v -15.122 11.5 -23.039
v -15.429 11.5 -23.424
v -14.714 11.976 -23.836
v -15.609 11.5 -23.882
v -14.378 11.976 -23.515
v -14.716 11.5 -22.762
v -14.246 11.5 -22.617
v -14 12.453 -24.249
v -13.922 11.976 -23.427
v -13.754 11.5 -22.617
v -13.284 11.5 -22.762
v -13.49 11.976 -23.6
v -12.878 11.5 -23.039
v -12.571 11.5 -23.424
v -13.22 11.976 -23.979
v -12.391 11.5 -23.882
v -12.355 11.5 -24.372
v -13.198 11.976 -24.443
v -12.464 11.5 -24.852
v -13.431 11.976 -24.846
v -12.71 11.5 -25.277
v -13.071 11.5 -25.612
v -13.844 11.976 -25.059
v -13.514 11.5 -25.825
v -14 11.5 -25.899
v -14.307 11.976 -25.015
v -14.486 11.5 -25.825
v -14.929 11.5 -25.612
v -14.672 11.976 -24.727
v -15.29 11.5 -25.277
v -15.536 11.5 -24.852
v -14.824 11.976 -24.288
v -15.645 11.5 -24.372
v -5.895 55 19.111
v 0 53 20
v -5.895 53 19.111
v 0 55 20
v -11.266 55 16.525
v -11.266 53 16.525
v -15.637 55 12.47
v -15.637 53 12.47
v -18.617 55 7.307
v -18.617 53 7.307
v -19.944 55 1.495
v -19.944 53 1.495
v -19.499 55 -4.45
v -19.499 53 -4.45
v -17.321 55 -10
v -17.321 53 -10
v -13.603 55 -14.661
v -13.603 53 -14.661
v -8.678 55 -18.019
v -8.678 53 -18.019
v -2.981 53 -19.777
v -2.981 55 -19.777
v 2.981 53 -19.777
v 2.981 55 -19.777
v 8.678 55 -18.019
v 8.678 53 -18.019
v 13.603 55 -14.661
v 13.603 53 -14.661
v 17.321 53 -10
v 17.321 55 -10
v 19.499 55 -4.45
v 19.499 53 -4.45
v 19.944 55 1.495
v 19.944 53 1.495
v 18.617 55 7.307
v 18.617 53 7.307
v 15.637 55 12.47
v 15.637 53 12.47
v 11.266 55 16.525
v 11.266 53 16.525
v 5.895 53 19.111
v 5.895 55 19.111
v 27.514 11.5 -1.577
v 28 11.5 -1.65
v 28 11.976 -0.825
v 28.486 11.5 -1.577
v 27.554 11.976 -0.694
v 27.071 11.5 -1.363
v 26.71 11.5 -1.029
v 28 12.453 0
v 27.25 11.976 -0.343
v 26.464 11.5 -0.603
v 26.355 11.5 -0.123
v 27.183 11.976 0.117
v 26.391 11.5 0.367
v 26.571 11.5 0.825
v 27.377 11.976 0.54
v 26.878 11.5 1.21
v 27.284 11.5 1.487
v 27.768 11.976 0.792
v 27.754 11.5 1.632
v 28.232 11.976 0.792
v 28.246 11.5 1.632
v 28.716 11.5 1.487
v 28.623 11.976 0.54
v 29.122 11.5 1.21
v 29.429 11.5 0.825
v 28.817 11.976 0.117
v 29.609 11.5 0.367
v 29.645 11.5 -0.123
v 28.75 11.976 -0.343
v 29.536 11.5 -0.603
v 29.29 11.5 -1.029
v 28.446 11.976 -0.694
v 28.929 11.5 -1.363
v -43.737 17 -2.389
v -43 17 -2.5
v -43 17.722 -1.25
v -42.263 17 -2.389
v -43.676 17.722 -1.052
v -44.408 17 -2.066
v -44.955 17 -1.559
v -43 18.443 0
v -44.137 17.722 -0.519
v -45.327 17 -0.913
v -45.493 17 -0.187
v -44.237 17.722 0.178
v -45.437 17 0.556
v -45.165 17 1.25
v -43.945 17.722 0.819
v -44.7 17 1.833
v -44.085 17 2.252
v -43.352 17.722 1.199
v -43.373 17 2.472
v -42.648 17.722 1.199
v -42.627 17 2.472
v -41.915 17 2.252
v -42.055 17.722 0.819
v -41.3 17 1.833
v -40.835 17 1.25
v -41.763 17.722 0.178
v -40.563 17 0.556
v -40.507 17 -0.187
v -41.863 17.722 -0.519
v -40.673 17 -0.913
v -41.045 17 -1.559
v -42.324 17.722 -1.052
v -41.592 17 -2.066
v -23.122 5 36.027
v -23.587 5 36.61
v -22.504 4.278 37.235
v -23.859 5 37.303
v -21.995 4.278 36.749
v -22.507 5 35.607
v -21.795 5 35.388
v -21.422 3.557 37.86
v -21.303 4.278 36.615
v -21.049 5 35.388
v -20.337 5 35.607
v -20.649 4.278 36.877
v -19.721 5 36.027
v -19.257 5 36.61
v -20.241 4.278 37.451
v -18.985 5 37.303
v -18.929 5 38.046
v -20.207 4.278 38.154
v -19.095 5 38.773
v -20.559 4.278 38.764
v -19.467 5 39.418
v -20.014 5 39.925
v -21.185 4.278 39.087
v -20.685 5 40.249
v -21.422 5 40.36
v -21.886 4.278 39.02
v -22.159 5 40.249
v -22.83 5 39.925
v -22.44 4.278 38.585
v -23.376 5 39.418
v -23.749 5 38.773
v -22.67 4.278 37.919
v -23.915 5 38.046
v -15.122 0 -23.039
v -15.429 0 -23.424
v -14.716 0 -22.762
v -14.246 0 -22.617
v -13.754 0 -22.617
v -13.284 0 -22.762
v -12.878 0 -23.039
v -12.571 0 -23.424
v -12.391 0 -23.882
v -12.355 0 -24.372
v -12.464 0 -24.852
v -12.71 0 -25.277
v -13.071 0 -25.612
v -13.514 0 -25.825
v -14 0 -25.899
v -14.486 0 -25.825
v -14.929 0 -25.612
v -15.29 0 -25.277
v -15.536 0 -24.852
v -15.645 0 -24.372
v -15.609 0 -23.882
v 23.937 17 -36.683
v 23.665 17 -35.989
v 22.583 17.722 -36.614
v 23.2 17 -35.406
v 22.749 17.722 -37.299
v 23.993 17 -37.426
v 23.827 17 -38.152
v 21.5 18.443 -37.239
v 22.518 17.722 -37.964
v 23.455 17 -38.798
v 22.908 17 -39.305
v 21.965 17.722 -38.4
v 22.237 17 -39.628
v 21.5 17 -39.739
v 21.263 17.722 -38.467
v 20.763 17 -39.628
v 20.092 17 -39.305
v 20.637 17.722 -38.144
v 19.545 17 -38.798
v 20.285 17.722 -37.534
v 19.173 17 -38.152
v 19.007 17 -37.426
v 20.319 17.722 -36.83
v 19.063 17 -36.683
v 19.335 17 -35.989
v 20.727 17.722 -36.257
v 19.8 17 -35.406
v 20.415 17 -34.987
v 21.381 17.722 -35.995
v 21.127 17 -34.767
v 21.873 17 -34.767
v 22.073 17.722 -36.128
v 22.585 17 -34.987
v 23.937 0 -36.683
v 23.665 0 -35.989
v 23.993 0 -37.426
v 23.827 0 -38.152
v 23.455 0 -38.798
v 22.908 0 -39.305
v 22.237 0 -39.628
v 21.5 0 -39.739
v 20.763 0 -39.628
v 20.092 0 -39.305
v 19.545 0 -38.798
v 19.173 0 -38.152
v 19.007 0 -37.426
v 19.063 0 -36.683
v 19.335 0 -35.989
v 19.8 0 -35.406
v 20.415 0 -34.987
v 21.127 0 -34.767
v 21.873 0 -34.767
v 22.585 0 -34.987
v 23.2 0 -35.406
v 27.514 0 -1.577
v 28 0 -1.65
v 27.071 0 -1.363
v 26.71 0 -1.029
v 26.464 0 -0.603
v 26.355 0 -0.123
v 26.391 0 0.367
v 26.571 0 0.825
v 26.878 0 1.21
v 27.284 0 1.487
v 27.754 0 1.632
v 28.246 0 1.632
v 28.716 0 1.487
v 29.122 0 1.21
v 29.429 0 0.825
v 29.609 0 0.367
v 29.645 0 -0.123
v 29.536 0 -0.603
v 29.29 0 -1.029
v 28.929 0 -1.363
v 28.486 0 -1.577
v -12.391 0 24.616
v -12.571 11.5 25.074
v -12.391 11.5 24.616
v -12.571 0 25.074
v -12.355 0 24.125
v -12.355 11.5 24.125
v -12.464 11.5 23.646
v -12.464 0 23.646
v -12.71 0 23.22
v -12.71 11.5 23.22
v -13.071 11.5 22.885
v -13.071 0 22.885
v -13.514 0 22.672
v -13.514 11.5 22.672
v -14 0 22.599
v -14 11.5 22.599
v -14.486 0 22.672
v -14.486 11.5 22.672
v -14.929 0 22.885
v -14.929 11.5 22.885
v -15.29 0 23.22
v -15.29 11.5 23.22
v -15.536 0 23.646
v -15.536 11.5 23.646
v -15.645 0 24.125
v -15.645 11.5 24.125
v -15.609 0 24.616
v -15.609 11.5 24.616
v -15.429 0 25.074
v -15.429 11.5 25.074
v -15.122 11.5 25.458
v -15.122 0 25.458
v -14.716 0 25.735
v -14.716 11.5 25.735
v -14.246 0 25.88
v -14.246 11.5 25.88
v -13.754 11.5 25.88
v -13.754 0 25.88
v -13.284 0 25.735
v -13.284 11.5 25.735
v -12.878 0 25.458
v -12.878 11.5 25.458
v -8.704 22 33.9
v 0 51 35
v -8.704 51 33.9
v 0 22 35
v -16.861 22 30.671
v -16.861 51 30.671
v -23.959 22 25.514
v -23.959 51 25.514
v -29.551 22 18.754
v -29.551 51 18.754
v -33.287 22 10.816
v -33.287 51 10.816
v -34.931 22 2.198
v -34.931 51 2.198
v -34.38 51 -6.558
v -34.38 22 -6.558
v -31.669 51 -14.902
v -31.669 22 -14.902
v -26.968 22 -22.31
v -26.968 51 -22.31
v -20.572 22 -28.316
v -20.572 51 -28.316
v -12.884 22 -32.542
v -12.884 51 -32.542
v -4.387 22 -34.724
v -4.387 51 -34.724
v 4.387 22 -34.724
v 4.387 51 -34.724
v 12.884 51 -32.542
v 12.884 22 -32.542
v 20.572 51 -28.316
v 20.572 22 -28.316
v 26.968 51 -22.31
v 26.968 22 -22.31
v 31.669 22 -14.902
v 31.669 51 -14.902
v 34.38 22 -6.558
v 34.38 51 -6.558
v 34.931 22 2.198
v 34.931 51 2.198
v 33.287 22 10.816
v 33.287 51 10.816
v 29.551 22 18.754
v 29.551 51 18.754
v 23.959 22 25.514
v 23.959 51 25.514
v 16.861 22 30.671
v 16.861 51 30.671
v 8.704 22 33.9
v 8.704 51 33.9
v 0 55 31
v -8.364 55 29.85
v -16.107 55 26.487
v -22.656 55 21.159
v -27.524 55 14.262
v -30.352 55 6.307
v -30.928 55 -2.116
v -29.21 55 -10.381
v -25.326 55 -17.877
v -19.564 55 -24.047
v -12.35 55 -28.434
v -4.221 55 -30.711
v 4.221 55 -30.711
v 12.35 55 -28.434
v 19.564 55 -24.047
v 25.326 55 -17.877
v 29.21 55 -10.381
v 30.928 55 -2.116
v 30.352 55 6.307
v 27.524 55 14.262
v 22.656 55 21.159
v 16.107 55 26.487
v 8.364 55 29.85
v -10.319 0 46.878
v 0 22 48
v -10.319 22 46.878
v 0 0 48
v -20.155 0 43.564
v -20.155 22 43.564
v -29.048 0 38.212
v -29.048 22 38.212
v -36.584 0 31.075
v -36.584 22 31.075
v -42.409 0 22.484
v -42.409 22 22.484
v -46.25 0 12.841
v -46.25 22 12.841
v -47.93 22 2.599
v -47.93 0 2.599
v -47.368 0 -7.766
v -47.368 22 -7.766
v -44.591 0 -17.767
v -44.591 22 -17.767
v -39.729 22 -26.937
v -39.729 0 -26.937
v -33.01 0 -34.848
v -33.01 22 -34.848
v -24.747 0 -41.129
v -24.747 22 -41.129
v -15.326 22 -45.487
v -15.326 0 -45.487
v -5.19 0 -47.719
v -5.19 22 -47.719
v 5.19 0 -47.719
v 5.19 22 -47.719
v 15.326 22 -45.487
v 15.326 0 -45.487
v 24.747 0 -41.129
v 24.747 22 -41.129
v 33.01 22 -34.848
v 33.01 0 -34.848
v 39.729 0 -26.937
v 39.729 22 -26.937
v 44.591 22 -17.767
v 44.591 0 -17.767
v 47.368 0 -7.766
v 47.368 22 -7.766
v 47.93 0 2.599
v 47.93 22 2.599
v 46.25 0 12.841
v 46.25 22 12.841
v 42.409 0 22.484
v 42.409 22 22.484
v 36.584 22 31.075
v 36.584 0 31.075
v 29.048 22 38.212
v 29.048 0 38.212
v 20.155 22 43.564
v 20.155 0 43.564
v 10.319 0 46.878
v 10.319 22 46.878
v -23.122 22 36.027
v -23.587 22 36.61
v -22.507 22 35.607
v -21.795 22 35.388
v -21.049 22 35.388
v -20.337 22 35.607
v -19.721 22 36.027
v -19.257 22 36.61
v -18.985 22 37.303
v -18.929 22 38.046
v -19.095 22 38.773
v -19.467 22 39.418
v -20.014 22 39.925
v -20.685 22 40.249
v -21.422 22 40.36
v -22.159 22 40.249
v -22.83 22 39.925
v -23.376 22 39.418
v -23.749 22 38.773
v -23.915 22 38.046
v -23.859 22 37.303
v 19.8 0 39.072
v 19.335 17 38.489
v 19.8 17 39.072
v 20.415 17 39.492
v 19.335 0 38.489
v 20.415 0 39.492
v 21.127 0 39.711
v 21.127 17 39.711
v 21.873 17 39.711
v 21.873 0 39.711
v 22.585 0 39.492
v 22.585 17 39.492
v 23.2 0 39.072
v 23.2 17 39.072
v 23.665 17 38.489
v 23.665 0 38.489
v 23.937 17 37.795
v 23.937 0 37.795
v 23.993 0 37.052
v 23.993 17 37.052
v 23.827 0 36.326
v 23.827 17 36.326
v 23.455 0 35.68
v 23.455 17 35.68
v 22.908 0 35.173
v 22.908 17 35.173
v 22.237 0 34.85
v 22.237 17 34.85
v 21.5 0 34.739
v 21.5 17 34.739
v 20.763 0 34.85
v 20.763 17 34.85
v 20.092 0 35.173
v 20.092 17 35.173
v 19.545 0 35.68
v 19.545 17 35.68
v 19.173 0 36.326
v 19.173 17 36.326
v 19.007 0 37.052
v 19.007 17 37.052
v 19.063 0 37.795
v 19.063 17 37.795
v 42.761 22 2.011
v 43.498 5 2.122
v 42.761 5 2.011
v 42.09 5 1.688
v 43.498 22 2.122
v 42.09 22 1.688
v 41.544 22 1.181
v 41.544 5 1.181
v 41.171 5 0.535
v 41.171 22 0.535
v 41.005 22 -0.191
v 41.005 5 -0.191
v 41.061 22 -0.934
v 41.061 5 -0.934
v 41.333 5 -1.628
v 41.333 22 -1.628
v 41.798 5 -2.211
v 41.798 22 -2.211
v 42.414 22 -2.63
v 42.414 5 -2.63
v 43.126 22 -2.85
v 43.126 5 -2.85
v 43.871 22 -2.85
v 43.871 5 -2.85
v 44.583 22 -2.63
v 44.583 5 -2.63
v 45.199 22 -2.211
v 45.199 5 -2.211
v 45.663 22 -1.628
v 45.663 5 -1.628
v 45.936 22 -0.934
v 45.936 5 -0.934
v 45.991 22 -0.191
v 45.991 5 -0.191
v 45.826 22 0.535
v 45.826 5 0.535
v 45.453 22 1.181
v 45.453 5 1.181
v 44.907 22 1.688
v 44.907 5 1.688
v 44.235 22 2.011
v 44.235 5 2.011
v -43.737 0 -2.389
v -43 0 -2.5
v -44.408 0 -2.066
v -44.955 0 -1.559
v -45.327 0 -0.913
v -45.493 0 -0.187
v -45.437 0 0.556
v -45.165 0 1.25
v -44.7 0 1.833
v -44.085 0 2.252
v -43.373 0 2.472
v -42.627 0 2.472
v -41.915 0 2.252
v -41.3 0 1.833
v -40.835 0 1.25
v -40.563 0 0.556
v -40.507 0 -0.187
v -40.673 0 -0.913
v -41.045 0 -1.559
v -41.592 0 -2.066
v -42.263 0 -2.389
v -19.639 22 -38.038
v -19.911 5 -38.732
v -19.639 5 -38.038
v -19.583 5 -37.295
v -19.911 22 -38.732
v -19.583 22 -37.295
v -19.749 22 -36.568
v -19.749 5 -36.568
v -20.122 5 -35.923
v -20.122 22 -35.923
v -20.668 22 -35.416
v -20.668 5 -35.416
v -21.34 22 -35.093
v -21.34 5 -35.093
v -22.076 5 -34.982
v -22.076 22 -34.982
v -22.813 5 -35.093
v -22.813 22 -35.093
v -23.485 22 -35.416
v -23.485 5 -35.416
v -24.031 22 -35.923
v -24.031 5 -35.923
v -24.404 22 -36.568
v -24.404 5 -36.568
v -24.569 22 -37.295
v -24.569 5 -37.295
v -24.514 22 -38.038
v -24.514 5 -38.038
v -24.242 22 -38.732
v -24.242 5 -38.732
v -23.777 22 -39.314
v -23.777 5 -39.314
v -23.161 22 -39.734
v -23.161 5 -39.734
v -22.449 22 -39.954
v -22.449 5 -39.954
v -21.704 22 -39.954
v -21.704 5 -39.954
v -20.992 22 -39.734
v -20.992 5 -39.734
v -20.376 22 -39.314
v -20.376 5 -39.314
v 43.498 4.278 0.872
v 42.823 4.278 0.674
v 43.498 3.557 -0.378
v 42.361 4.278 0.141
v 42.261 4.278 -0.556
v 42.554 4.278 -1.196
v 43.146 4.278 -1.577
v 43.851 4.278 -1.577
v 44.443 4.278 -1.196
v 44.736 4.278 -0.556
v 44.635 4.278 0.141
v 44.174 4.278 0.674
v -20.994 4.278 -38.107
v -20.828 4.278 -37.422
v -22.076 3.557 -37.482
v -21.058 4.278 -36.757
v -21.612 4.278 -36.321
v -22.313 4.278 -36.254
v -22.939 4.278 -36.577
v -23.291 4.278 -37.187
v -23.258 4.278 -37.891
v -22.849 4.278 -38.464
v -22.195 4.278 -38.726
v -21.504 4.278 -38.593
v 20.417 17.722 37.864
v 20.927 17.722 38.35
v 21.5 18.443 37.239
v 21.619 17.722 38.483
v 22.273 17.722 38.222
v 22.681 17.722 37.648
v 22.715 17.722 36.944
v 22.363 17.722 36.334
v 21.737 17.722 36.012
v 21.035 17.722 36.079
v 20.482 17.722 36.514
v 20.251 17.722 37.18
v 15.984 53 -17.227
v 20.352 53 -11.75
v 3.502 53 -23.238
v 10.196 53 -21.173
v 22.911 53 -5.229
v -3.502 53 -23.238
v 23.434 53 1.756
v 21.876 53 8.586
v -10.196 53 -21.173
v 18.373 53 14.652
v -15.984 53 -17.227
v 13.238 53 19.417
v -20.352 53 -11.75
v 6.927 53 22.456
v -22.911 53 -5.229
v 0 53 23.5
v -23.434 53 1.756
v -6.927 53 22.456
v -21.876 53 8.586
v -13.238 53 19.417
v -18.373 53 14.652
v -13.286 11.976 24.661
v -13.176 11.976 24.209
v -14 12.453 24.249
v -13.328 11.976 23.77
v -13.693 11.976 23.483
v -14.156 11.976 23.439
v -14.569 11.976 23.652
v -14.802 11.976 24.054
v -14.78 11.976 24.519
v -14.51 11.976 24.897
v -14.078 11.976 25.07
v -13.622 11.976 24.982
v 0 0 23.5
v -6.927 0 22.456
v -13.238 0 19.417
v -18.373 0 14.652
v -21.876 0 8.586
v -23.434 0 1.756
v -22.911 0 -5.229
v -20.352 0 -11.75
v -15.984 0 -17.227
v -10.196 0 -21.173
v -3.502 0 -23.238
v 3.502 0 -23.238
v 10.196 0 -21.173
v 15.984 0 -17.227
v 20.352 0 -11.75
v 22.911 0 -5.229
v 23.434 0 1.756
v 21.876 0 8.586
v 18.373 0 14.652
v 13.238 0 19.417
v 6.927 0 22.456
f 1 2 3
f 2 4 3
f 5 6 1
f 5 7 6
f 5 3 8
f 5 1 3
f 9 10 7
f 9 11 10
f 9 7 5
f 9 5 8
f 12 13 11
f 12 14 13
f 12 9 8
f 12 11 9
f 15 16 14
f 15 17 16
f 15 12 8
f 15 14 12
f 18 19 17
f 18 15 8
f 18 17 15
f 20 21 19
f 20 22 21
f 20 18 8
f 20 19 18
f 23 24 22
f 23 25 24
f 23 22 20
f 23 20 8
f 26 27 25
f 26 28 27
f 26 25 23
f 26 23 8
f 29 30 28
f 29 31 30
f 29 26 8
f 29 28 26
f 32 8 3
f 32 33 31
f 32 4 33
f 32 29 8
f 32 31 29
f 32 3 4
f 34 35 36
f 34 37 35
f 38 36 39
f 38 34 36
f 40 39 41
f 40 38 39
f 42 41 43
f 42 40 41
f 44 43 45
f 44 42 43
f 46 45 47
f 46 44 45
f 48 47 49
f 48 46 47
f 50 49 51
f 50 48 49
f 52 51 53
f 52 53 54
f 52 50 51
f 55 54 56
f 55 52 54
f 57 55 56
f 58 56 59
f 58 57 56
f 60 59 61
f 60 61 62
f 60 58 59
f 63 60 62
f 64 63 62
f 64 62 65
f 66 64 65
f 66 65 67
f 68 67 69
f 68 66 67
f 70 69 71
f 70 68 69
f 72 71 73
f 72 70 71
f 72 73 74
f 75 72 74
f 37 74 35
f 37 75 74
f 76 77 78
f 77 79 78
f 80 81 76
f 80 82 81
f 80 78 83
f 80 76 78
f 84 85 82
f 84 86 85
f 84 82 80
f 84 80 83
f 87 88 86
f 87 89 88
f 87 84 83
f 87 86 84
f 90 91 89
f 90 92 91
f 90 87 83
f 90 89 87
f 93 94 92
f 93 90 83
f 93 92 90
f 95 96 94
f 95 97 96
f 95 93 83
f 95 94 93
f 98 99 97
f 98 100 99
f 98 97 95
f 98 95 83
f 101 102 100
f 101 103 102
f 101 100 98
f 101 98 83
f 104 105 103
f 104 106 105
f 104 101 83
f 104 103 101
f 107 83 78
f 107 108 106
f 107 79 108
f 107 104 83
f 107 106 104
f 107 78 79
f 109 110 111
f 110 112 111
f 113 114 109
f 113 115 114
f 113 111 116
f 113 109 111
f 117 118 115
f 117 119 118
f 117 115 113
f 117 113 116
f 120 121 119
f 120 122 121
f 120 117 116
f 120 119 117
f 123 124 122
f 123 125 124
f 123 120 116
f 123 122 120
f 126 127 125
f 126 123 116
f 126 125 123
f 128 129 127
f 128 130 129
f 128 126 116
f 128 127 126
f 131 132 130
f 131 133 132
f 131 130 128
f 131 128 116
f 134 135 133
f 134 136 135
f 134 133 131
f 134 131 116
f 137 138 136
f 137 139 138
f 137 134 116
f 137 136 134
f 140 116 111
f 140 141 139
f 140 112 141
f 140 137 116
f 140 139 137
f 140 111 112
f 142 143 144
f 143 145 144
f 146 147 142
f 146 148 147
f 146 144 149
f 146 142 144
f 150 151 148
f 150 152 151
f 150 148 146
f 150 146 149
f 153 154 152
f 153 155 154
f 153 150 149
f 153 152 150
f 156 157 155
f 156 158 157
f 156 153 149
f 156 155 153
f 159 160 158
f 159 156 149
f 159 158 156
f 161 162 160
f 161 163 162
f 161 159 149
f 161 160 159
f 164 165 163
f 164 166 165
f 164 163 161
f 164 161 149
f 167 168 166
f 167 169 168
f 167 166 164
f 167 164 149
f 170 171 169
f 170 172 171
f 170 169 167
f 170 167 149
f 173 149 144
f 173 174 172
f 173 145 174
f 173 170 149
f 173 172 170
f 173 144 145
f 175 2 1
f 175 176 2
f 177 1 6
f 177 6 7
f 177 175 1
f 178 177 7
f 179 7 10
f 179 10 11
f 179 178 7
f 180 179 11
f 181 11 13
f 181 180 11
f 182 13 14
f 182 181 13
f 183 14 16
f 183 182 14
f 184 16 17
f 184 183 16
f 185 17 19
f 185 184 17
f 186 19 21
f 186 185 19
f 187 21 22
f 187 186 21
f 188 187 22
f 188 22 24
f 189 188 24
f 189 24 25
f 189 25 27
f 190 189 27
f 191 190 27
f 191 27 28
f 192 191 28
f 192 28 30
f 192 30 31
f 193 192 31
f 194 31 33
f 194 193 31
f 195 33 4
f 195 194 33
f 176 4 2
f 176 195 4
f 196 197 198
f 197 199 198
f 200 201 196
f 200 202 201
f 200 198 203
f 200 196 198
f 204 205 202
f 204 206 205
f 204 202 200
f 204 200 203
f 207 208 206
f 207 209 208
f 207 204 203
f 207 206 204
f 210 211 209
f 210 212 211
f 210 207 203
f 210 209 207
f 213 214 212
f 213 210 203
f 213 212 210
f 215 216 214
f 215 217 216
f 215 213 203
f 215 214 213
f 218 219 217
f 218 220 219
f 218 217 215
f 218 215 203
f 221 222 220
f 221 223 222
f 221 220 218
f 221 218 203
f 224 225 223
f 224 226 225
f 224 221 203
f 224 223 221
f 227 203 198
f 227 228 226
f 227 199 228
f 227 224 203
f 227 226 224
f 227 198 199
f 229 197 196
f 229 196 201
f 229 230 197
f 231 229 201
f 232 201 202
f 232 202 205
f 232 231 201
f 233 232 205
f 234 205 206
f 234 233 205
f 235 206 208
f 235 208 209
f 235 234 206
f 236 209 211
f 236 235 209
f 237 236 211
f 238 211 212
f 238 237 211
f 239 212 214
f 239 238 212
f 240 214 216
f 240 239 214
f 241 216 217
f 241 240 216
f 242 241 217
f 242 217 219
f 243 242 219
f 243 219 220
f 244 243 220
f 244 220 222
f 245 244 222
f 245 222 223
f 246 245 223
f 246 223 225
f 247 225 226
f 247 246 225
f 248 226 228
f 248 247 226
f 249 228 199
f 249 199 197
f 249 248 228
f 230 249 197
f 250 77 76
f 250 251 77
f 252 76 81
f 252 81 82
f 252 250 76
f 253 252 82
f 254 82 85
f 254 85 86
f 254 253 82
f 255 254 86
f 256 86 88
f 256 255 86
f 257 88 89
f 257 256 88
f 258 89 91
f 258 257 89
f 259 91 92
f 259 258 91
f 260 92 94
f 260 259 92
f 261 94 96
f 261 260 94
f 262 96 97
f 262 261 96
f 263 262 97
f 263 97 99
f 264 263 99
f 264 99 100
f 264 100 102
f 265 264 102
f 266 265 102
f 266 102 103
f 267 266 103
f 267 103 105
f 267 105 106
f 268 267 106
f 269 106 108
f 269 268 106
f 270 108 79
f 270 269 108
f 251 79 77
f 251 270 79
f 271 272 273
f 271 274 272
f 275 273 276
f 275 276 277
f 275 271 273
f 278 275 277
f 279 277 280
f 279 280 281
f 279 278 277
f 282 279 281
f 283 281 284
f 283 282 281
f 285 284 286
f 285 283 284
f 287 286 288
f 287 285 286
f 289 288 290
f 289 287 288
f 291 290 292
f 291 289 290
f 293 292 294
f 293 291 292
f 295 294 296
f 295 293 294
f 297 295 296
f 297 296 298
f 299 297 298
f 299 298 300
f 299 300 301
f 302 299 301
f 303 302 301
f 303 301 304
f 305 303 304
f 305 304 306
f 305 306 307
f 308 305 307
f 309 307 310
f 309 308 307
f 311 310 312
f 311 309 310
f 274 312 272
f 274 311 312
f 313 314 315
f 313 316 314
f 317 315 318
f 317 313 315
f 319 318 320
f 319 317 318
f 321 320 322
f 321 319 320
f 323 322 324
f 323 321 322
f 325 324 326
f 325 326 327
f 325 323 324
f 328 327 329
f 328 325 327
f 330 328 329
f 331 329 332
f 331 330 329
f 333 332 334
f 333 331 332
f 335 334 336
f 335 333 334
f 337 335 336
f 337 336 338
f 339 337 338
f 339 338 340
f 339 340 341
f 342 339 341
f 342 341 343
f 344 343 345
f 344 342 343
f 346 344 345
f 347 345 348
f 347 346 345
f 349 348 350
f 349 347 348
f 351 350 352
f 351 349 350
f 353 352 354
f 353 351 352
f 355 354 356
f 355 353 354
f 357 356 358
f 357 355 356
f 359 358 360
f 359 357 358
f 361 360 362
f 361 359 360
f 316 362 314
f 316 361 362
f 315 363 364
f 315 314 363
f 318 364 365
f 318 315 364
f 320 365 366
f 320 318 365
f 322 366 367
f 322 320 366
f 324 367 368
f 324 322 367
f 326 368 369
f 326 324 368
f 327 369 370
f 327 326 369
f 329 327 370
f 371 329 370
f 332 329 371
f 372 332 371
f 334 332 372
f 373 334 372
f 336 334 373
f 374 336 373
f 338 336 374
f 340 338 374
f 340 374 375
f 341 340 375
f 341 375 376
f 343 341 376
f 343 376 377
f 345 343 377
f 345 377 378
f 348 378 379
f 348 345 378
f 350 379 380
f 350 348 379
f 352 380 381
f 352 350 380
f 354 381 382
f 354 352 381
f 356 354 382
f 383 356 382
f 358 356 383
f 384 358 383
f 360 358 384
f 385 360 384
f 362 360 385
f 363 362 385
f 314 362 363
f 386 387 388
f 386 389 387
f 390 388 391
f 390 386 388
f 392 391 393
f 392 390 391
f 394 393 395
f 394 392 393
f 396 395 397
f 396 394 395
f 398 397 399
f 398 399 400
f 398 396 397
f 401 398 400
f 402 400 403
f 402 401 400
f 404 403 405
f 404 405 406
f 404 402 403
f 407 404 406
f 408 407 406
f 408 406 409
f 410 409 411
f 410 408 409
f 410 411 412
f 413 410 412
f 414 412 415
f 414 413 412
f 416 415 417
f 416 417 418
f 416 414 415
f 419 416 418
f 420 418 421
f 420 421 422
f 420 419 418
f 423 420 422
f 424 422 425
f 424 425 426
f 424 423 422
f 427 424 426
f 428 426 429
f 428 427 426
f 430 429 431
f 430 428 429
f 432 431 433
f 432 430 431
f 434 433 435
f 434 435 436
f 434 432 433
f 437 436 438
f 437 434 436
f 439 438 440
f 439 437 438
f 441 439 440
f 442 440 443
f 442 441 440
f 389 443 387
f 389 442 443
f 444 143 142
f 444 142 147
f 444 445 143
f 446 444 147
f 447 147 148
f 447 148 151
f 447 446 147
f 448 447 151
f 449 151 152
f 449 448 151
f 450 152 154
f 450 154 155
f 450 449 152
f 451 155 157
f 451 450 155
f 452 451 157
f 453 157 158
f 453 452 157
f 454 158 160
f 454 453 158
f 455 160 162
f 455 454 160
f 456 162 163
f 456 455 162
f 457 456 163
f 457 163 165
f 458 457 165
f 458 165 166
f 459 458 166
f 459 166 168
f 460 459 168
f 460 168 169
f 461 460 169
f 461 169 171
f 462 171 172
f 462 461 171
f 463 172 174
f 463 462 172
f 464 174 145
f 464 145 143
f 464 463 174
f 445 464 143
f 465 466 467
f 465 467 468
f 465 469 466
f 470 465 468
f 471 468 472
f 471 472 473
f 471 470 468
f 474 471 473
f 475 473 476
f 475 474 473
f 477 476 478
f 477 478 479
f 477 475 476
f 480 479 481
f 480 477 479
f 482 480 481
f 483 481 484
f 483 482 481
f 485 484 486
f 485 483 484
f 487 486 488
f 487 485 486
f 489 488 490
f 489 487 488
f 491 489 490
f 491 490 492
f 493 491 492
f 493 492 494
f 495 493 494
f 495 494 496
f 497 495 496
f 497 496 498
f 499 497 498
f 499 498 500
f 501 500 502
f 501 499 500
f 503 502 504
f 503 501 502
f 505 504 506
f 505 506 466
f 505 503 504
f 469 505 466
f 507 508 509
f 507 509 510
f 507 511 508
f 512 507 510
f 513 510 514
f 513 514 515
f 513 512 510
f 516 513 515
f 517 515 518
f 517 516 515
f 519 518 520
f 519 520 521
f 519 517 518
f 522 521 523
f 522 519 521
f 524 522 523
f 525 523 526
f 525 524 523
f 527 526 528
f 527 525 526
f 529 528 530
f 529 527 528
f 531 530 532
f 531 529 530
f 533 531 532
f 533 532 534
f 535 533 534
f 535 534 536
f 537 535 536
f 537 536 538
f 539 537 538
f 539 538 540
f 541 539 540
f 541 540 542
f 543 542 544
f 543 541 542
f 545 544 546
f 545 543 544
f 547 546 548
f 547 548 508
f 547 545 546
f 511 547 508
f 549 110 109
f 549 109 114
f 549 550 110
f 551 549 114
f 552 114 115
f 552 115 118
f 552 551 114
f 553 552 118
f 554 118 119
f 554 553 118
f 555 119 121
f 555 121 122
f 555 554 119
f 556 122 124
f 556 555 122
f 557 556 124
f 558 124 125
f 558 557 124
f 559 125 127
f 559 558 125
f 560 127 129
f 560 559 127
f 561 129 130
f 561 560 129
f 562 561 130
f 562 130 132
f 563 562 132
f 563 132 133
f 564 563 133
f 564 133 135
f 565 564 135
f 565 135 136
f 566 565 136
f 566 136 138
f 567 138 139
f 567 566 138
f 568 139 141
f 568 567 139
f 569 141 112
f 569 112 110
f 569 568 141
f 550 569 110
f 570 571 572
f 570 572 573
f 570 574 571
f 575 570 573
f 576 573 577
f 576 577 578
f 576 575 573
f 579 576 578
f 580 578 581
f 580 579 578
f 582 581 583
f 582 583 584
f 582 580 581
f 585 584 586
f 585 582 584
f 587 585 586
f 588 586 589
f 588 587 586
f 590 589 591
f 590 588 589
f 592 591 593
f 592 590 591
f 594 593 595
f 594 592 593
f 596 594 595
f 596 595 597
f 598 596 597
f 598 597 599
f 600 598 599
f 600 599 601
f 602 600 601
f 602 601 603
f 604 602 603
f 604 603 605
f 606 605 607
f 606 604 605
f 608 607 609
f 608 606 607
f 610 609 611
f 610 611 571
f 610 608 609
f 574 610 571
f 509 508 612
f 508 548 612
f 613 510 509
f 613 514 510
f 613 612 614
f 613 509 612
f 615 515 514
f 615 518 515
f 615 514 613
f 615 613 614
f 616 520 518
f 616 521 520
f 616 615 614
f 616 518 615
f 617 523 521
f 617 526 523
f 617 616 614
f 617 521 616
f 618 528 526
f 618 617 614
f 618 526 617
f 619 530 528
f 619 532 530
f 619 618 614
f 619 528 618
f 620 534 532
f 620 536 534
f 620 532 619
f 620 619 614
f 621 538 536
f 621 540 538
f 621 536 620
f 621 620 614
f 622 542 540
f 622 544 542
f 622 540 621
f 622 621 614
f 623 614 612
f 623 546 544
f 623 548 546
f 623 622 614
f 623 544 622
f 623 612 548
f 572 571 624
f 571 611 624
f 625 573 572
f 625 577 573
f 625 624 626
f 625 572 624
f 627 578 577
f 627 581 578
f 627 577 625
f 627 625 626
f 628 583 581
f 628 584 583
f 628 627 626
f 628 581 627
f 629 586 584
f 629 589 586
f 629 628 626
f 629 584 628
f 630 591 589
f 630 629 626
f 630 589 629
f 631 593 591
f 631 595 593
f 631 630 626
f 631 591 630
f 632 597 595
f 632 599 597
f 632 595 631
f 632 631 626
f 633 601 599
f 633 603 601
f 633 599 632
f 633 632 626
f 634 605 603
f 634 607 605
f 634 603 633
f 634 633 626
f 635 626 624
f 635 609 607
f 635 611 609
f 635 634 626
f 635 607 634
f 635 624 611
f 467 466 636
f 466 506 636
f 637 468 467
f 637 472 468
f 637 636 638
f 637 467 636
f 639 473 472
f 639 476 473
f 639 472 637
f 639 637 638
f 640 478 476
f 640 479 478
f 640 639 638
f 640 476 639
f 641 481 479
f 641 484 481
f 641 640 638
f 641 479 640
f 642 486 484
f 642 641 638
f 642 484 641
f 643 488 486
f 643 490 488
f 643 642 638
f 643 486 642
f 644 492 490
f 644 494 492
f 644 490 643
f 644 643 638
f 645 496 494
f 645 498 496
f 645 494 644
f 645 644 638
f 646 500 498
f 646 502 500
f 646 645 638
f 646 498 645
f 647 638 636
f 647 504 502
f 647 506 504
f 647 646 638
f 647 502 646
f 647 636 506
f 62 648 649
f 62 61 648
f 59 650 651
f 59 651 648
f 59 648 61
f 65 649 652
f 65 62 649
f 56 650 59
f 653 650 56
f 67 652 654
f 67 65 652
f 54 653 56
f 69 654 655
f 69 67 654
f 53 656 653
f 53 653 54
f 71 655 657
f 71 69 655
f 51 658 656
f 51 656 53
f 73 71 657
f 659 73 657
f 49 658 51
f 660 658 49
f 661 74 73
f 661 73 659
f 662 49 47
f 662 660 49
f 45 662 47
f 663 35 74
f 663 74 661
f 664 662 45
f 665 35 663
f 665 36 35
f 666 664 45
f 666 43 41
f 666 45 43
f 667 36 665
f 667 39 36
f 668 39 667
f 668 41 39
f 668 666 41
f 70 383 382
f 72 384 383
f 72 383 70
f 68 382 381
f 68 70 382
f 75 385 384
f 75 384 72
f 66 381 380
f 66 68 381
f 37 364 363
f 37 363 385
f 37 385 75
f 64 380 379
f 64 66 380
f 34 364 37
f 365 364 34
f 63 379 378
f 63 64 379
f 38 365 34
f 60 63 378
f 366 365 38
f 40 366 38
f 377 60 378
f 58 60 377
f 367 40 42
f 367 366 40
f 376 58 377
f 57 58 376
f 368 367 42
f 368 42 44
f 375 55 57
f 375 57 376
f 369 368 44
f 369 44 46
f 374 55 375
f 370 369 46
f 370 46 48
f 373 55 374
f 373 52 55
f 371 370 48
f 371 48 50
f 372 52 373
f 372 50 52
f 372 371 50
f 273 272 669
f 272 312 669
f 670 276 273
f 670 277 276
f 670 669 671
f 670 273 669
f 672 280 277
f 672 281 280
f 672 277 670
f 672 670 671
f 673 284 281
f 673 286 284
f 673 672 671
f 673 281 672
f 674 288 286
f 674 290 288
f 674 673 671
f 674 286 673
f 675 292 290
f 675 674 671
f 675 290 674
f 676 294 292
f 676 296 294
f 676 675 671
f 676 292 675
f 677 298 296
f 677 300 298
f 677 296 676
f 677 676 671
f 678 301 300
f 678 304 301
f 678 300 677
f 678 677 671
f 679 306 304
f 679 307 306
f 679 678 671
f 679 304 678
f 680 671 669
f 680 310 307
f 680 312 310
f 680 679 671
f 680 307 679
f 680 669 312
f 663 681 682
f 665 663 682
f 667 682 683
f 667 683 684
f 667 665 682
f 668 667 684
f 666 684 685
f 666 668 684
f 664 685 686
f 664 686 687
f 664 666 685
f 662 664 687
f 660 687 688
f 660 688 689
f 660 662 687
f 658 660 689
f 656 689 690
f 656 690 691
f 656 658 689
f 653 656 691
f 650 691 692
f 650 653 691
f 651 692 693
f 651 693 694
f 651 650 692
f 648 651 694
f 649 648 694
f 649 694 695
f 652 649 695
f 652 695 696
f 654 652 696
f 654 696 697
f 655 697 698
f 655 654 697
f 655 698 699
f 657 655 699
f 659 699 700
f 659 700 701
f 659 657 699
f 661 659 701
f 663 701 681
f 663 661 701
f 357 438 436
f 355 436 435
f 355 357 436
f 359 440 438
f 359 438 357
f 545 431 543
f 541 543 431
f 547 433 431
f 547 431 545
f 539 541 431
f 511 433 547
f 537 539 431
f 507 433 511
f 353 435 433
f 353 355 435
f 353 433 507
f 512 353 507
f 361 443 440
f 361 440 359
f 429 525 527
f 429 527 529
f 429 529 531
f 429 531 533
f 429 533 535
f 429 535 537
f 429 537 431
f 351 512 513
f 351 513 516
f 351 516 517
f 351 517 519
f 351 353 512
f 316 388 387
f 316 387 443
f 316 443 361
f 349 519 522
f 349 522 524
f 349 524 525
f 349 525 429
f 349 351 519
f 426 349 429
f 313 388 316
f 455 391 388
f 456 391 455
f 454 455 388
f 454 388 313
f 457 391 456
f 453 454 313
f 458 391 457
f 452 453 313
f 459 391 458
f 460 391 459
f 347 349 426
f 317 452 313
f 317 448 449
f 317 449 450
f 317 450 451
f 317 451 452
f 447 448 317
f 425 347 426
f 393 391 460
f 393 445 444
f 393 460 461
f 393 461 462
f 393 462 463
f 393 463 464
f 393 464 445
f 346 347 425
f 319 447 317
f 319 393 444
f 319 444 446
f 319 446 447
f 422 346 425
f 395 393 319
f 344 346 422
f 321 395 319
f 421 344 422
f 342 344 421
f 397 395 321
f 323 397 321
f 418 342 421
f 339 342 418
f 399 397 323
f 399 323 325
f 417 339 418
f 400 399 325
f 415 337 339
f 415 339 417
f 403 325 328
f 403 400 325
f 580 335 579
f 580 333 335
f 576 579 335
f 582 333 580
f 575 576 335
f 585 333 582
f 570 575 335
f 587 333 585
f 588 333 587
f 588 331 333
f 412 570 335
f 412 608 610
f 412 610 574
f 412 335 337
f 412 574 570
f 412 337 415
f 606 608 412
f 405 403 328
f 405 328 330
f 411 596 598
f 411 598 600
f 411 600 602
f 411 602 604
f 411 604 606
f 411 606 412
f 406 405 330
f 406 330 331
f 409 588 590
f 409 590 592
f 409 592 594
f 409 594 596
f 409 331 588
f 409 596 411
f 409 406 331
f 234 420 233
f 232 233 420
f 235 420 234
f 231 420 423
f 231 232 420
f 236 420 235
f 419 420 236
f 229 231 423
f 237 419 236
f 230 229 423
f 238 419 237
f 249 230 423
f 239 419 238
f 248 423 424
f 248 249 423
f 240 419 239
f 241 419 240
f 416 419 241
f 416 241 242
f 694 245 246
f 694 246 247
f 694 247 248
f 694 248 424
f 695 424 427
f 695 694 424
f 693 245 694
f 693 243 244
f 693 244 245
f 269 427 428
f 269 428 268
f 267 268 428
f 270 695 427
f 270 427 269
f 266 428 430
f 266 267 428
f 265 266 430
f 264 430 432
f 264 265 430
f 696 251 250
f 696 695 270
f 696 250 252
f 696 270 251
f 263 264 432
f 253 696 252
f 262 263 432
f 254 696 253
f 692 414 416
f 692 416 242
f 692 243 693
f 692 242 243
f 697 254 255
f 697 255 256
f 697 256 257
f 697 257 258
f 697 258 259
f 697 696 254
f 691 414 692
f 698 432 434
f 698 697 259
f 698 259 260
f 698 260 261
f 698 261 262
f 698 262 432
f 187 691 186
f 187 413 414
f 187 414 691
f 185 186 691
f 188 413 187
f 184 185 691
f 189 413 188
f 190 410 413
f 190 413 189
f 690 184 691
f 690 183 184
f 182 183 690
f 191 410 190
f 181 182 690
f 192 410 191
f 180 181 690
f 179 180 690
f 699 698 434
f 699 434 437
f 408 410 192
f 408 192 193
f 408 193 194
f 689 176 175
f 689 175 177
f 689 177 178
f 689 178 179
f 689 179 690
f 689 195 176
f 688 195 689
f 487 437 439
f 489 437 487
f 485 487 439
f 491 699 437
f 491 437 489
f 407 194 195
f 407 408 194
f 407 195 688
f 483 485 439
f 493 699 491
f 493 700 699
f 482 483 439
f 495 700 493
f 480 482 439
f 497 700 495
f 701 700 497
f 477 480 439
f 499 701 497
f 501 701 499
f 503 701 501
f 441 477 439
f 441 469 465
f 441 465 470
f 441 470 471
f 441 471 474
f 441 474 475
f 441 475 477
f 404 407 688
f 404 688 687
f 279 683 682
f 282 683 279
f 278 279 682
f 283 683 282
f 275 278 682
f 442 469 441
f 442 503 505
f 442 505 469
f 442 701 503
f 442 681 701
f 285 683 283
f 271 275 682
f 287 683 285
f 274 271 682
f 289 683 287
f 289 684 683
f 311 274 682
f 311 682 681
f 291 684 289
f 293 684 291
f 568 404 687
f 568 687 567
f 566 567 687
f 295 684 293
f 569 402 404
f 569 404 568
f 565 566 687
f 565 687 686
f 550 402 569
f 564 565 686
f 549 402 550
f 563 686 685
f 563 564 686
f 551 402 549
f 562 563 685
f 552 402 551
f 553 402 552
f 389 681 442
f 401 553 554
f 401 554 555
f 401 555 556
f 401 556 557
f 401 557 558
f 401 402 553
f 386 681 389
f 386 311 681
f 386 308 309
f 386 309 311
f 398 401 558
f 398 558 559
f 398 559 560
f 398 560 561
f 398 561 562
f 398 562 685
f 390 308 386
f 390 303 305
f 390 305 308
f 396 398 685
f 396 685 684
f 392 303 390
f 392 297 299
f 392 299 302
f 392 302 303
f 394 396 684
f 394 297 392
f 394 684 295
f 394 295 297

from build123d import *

# Parameters (mm, degrees)
R_P_TITION_CIRCULAIRE1_COUNT = 3


with BuildPart() as part:
    # Esquisse1 → Révolution1 (revolve)
    with BuildSketch(Plane.XY, mode=Mode.PRIVATE) as r_volution1_sk:
        Polygon((23.5, 0), (23.5, 53), (20, 53), (20, 55), (31, 55), (35, 51), (35, 22), (48, 22), (48, 0), align=None)
    revolve(r_volution1_sk.sketch.rotate(Axis((0, 45.247444815, 0), (0, -1, 0)), 90), axis=Axis((0, 45.247444815, 0), (0, -1, 0)))

    # Esquisse2 → Trou taraudé M61 (revolve, cut)
    with BuildSketch(Plane(origin=(43.498358535, 22, -0.377895148), x_dir=(0, 0, 1), z_dir=(1, 0, 0))):
        Polygon((0, 0), (0, 18.443375673), (2.5, 17), (2.5, 0), align=None)
    trou_taraud_m61 = revolve(axis=Axis((43.498358535, 28.35, -0.377895148), (0, -1, 0)), mode=Mode.SUBTRACT)

    # Esquisse3 → Trou taraudé M41 (revolve, cut)
    with BuildSketch(Plane(origin=(28, 0, 0), x_dir=(0, 0, -1), z_dir=(1, 0, 0))):
        Polygon((0, 0), (0, 12.452627944), (1.65, 11.5), (1.65, 0), align=None)
    trou_taraud_m41 = revolve(axis=Axis((28, -6.35, 0), (0, 1, 0)), mode=Mode.SUBTRACT)

    # Esquisse4 → Trou taraudé M62 (revolve, cut)
    with BuildSketch(Plane(origin=(-43, 0, 0), x_dir=(0, 0, -1), z_dir=(1, 0, 0))):
        Polygon((0, 0), (0, 18.443375673), (2.5, 17), (2.5, 0), align=None)
    trou_taraud_m62 = revolve(axis=Axis((-43, -6.35, 0), (0, 1, 0)), mode=Mode.SUBTRACT)

    # Répétition circulaire1: Trou taraudé M61, Trou taraudé M41, Trou taraudé M62 ×3 about axis
    r_p_tition_circulaire1_axis = Axis((0, 0, 0), (0, 1, 0))
    add([trou_taraud_m61.rotate(r_p_tition_circulaire1_axis, i * 360 / R_P_TITION_CIRCULAIRE1_COUNT) for i in range(1, R_P_TITION_CIRCULAIRE1_COUNT)], mode=Mode.SUBTRACT)
    add([trou_taraud_m41.rotate(r_p_tition_circulaire1_axis, i * 360 / R_P_TITION_CIRCULAIRE1_COUNT) for i in range(1, R_P_TITION_CIRCULAIRE1_COUNT)], mode=Mode.SUBTRACT)
    add([trou_taraud_m62.rotate(r_p_tition_circulaire1_axis, i * 360 / R_P_TITION_CIRCULAIRE1_COUNT) for i in range(1, R_P_TITION_CIRCULAIRE1_COUNT)], mode=Mode.SUBTRACT)


solid = part.part
